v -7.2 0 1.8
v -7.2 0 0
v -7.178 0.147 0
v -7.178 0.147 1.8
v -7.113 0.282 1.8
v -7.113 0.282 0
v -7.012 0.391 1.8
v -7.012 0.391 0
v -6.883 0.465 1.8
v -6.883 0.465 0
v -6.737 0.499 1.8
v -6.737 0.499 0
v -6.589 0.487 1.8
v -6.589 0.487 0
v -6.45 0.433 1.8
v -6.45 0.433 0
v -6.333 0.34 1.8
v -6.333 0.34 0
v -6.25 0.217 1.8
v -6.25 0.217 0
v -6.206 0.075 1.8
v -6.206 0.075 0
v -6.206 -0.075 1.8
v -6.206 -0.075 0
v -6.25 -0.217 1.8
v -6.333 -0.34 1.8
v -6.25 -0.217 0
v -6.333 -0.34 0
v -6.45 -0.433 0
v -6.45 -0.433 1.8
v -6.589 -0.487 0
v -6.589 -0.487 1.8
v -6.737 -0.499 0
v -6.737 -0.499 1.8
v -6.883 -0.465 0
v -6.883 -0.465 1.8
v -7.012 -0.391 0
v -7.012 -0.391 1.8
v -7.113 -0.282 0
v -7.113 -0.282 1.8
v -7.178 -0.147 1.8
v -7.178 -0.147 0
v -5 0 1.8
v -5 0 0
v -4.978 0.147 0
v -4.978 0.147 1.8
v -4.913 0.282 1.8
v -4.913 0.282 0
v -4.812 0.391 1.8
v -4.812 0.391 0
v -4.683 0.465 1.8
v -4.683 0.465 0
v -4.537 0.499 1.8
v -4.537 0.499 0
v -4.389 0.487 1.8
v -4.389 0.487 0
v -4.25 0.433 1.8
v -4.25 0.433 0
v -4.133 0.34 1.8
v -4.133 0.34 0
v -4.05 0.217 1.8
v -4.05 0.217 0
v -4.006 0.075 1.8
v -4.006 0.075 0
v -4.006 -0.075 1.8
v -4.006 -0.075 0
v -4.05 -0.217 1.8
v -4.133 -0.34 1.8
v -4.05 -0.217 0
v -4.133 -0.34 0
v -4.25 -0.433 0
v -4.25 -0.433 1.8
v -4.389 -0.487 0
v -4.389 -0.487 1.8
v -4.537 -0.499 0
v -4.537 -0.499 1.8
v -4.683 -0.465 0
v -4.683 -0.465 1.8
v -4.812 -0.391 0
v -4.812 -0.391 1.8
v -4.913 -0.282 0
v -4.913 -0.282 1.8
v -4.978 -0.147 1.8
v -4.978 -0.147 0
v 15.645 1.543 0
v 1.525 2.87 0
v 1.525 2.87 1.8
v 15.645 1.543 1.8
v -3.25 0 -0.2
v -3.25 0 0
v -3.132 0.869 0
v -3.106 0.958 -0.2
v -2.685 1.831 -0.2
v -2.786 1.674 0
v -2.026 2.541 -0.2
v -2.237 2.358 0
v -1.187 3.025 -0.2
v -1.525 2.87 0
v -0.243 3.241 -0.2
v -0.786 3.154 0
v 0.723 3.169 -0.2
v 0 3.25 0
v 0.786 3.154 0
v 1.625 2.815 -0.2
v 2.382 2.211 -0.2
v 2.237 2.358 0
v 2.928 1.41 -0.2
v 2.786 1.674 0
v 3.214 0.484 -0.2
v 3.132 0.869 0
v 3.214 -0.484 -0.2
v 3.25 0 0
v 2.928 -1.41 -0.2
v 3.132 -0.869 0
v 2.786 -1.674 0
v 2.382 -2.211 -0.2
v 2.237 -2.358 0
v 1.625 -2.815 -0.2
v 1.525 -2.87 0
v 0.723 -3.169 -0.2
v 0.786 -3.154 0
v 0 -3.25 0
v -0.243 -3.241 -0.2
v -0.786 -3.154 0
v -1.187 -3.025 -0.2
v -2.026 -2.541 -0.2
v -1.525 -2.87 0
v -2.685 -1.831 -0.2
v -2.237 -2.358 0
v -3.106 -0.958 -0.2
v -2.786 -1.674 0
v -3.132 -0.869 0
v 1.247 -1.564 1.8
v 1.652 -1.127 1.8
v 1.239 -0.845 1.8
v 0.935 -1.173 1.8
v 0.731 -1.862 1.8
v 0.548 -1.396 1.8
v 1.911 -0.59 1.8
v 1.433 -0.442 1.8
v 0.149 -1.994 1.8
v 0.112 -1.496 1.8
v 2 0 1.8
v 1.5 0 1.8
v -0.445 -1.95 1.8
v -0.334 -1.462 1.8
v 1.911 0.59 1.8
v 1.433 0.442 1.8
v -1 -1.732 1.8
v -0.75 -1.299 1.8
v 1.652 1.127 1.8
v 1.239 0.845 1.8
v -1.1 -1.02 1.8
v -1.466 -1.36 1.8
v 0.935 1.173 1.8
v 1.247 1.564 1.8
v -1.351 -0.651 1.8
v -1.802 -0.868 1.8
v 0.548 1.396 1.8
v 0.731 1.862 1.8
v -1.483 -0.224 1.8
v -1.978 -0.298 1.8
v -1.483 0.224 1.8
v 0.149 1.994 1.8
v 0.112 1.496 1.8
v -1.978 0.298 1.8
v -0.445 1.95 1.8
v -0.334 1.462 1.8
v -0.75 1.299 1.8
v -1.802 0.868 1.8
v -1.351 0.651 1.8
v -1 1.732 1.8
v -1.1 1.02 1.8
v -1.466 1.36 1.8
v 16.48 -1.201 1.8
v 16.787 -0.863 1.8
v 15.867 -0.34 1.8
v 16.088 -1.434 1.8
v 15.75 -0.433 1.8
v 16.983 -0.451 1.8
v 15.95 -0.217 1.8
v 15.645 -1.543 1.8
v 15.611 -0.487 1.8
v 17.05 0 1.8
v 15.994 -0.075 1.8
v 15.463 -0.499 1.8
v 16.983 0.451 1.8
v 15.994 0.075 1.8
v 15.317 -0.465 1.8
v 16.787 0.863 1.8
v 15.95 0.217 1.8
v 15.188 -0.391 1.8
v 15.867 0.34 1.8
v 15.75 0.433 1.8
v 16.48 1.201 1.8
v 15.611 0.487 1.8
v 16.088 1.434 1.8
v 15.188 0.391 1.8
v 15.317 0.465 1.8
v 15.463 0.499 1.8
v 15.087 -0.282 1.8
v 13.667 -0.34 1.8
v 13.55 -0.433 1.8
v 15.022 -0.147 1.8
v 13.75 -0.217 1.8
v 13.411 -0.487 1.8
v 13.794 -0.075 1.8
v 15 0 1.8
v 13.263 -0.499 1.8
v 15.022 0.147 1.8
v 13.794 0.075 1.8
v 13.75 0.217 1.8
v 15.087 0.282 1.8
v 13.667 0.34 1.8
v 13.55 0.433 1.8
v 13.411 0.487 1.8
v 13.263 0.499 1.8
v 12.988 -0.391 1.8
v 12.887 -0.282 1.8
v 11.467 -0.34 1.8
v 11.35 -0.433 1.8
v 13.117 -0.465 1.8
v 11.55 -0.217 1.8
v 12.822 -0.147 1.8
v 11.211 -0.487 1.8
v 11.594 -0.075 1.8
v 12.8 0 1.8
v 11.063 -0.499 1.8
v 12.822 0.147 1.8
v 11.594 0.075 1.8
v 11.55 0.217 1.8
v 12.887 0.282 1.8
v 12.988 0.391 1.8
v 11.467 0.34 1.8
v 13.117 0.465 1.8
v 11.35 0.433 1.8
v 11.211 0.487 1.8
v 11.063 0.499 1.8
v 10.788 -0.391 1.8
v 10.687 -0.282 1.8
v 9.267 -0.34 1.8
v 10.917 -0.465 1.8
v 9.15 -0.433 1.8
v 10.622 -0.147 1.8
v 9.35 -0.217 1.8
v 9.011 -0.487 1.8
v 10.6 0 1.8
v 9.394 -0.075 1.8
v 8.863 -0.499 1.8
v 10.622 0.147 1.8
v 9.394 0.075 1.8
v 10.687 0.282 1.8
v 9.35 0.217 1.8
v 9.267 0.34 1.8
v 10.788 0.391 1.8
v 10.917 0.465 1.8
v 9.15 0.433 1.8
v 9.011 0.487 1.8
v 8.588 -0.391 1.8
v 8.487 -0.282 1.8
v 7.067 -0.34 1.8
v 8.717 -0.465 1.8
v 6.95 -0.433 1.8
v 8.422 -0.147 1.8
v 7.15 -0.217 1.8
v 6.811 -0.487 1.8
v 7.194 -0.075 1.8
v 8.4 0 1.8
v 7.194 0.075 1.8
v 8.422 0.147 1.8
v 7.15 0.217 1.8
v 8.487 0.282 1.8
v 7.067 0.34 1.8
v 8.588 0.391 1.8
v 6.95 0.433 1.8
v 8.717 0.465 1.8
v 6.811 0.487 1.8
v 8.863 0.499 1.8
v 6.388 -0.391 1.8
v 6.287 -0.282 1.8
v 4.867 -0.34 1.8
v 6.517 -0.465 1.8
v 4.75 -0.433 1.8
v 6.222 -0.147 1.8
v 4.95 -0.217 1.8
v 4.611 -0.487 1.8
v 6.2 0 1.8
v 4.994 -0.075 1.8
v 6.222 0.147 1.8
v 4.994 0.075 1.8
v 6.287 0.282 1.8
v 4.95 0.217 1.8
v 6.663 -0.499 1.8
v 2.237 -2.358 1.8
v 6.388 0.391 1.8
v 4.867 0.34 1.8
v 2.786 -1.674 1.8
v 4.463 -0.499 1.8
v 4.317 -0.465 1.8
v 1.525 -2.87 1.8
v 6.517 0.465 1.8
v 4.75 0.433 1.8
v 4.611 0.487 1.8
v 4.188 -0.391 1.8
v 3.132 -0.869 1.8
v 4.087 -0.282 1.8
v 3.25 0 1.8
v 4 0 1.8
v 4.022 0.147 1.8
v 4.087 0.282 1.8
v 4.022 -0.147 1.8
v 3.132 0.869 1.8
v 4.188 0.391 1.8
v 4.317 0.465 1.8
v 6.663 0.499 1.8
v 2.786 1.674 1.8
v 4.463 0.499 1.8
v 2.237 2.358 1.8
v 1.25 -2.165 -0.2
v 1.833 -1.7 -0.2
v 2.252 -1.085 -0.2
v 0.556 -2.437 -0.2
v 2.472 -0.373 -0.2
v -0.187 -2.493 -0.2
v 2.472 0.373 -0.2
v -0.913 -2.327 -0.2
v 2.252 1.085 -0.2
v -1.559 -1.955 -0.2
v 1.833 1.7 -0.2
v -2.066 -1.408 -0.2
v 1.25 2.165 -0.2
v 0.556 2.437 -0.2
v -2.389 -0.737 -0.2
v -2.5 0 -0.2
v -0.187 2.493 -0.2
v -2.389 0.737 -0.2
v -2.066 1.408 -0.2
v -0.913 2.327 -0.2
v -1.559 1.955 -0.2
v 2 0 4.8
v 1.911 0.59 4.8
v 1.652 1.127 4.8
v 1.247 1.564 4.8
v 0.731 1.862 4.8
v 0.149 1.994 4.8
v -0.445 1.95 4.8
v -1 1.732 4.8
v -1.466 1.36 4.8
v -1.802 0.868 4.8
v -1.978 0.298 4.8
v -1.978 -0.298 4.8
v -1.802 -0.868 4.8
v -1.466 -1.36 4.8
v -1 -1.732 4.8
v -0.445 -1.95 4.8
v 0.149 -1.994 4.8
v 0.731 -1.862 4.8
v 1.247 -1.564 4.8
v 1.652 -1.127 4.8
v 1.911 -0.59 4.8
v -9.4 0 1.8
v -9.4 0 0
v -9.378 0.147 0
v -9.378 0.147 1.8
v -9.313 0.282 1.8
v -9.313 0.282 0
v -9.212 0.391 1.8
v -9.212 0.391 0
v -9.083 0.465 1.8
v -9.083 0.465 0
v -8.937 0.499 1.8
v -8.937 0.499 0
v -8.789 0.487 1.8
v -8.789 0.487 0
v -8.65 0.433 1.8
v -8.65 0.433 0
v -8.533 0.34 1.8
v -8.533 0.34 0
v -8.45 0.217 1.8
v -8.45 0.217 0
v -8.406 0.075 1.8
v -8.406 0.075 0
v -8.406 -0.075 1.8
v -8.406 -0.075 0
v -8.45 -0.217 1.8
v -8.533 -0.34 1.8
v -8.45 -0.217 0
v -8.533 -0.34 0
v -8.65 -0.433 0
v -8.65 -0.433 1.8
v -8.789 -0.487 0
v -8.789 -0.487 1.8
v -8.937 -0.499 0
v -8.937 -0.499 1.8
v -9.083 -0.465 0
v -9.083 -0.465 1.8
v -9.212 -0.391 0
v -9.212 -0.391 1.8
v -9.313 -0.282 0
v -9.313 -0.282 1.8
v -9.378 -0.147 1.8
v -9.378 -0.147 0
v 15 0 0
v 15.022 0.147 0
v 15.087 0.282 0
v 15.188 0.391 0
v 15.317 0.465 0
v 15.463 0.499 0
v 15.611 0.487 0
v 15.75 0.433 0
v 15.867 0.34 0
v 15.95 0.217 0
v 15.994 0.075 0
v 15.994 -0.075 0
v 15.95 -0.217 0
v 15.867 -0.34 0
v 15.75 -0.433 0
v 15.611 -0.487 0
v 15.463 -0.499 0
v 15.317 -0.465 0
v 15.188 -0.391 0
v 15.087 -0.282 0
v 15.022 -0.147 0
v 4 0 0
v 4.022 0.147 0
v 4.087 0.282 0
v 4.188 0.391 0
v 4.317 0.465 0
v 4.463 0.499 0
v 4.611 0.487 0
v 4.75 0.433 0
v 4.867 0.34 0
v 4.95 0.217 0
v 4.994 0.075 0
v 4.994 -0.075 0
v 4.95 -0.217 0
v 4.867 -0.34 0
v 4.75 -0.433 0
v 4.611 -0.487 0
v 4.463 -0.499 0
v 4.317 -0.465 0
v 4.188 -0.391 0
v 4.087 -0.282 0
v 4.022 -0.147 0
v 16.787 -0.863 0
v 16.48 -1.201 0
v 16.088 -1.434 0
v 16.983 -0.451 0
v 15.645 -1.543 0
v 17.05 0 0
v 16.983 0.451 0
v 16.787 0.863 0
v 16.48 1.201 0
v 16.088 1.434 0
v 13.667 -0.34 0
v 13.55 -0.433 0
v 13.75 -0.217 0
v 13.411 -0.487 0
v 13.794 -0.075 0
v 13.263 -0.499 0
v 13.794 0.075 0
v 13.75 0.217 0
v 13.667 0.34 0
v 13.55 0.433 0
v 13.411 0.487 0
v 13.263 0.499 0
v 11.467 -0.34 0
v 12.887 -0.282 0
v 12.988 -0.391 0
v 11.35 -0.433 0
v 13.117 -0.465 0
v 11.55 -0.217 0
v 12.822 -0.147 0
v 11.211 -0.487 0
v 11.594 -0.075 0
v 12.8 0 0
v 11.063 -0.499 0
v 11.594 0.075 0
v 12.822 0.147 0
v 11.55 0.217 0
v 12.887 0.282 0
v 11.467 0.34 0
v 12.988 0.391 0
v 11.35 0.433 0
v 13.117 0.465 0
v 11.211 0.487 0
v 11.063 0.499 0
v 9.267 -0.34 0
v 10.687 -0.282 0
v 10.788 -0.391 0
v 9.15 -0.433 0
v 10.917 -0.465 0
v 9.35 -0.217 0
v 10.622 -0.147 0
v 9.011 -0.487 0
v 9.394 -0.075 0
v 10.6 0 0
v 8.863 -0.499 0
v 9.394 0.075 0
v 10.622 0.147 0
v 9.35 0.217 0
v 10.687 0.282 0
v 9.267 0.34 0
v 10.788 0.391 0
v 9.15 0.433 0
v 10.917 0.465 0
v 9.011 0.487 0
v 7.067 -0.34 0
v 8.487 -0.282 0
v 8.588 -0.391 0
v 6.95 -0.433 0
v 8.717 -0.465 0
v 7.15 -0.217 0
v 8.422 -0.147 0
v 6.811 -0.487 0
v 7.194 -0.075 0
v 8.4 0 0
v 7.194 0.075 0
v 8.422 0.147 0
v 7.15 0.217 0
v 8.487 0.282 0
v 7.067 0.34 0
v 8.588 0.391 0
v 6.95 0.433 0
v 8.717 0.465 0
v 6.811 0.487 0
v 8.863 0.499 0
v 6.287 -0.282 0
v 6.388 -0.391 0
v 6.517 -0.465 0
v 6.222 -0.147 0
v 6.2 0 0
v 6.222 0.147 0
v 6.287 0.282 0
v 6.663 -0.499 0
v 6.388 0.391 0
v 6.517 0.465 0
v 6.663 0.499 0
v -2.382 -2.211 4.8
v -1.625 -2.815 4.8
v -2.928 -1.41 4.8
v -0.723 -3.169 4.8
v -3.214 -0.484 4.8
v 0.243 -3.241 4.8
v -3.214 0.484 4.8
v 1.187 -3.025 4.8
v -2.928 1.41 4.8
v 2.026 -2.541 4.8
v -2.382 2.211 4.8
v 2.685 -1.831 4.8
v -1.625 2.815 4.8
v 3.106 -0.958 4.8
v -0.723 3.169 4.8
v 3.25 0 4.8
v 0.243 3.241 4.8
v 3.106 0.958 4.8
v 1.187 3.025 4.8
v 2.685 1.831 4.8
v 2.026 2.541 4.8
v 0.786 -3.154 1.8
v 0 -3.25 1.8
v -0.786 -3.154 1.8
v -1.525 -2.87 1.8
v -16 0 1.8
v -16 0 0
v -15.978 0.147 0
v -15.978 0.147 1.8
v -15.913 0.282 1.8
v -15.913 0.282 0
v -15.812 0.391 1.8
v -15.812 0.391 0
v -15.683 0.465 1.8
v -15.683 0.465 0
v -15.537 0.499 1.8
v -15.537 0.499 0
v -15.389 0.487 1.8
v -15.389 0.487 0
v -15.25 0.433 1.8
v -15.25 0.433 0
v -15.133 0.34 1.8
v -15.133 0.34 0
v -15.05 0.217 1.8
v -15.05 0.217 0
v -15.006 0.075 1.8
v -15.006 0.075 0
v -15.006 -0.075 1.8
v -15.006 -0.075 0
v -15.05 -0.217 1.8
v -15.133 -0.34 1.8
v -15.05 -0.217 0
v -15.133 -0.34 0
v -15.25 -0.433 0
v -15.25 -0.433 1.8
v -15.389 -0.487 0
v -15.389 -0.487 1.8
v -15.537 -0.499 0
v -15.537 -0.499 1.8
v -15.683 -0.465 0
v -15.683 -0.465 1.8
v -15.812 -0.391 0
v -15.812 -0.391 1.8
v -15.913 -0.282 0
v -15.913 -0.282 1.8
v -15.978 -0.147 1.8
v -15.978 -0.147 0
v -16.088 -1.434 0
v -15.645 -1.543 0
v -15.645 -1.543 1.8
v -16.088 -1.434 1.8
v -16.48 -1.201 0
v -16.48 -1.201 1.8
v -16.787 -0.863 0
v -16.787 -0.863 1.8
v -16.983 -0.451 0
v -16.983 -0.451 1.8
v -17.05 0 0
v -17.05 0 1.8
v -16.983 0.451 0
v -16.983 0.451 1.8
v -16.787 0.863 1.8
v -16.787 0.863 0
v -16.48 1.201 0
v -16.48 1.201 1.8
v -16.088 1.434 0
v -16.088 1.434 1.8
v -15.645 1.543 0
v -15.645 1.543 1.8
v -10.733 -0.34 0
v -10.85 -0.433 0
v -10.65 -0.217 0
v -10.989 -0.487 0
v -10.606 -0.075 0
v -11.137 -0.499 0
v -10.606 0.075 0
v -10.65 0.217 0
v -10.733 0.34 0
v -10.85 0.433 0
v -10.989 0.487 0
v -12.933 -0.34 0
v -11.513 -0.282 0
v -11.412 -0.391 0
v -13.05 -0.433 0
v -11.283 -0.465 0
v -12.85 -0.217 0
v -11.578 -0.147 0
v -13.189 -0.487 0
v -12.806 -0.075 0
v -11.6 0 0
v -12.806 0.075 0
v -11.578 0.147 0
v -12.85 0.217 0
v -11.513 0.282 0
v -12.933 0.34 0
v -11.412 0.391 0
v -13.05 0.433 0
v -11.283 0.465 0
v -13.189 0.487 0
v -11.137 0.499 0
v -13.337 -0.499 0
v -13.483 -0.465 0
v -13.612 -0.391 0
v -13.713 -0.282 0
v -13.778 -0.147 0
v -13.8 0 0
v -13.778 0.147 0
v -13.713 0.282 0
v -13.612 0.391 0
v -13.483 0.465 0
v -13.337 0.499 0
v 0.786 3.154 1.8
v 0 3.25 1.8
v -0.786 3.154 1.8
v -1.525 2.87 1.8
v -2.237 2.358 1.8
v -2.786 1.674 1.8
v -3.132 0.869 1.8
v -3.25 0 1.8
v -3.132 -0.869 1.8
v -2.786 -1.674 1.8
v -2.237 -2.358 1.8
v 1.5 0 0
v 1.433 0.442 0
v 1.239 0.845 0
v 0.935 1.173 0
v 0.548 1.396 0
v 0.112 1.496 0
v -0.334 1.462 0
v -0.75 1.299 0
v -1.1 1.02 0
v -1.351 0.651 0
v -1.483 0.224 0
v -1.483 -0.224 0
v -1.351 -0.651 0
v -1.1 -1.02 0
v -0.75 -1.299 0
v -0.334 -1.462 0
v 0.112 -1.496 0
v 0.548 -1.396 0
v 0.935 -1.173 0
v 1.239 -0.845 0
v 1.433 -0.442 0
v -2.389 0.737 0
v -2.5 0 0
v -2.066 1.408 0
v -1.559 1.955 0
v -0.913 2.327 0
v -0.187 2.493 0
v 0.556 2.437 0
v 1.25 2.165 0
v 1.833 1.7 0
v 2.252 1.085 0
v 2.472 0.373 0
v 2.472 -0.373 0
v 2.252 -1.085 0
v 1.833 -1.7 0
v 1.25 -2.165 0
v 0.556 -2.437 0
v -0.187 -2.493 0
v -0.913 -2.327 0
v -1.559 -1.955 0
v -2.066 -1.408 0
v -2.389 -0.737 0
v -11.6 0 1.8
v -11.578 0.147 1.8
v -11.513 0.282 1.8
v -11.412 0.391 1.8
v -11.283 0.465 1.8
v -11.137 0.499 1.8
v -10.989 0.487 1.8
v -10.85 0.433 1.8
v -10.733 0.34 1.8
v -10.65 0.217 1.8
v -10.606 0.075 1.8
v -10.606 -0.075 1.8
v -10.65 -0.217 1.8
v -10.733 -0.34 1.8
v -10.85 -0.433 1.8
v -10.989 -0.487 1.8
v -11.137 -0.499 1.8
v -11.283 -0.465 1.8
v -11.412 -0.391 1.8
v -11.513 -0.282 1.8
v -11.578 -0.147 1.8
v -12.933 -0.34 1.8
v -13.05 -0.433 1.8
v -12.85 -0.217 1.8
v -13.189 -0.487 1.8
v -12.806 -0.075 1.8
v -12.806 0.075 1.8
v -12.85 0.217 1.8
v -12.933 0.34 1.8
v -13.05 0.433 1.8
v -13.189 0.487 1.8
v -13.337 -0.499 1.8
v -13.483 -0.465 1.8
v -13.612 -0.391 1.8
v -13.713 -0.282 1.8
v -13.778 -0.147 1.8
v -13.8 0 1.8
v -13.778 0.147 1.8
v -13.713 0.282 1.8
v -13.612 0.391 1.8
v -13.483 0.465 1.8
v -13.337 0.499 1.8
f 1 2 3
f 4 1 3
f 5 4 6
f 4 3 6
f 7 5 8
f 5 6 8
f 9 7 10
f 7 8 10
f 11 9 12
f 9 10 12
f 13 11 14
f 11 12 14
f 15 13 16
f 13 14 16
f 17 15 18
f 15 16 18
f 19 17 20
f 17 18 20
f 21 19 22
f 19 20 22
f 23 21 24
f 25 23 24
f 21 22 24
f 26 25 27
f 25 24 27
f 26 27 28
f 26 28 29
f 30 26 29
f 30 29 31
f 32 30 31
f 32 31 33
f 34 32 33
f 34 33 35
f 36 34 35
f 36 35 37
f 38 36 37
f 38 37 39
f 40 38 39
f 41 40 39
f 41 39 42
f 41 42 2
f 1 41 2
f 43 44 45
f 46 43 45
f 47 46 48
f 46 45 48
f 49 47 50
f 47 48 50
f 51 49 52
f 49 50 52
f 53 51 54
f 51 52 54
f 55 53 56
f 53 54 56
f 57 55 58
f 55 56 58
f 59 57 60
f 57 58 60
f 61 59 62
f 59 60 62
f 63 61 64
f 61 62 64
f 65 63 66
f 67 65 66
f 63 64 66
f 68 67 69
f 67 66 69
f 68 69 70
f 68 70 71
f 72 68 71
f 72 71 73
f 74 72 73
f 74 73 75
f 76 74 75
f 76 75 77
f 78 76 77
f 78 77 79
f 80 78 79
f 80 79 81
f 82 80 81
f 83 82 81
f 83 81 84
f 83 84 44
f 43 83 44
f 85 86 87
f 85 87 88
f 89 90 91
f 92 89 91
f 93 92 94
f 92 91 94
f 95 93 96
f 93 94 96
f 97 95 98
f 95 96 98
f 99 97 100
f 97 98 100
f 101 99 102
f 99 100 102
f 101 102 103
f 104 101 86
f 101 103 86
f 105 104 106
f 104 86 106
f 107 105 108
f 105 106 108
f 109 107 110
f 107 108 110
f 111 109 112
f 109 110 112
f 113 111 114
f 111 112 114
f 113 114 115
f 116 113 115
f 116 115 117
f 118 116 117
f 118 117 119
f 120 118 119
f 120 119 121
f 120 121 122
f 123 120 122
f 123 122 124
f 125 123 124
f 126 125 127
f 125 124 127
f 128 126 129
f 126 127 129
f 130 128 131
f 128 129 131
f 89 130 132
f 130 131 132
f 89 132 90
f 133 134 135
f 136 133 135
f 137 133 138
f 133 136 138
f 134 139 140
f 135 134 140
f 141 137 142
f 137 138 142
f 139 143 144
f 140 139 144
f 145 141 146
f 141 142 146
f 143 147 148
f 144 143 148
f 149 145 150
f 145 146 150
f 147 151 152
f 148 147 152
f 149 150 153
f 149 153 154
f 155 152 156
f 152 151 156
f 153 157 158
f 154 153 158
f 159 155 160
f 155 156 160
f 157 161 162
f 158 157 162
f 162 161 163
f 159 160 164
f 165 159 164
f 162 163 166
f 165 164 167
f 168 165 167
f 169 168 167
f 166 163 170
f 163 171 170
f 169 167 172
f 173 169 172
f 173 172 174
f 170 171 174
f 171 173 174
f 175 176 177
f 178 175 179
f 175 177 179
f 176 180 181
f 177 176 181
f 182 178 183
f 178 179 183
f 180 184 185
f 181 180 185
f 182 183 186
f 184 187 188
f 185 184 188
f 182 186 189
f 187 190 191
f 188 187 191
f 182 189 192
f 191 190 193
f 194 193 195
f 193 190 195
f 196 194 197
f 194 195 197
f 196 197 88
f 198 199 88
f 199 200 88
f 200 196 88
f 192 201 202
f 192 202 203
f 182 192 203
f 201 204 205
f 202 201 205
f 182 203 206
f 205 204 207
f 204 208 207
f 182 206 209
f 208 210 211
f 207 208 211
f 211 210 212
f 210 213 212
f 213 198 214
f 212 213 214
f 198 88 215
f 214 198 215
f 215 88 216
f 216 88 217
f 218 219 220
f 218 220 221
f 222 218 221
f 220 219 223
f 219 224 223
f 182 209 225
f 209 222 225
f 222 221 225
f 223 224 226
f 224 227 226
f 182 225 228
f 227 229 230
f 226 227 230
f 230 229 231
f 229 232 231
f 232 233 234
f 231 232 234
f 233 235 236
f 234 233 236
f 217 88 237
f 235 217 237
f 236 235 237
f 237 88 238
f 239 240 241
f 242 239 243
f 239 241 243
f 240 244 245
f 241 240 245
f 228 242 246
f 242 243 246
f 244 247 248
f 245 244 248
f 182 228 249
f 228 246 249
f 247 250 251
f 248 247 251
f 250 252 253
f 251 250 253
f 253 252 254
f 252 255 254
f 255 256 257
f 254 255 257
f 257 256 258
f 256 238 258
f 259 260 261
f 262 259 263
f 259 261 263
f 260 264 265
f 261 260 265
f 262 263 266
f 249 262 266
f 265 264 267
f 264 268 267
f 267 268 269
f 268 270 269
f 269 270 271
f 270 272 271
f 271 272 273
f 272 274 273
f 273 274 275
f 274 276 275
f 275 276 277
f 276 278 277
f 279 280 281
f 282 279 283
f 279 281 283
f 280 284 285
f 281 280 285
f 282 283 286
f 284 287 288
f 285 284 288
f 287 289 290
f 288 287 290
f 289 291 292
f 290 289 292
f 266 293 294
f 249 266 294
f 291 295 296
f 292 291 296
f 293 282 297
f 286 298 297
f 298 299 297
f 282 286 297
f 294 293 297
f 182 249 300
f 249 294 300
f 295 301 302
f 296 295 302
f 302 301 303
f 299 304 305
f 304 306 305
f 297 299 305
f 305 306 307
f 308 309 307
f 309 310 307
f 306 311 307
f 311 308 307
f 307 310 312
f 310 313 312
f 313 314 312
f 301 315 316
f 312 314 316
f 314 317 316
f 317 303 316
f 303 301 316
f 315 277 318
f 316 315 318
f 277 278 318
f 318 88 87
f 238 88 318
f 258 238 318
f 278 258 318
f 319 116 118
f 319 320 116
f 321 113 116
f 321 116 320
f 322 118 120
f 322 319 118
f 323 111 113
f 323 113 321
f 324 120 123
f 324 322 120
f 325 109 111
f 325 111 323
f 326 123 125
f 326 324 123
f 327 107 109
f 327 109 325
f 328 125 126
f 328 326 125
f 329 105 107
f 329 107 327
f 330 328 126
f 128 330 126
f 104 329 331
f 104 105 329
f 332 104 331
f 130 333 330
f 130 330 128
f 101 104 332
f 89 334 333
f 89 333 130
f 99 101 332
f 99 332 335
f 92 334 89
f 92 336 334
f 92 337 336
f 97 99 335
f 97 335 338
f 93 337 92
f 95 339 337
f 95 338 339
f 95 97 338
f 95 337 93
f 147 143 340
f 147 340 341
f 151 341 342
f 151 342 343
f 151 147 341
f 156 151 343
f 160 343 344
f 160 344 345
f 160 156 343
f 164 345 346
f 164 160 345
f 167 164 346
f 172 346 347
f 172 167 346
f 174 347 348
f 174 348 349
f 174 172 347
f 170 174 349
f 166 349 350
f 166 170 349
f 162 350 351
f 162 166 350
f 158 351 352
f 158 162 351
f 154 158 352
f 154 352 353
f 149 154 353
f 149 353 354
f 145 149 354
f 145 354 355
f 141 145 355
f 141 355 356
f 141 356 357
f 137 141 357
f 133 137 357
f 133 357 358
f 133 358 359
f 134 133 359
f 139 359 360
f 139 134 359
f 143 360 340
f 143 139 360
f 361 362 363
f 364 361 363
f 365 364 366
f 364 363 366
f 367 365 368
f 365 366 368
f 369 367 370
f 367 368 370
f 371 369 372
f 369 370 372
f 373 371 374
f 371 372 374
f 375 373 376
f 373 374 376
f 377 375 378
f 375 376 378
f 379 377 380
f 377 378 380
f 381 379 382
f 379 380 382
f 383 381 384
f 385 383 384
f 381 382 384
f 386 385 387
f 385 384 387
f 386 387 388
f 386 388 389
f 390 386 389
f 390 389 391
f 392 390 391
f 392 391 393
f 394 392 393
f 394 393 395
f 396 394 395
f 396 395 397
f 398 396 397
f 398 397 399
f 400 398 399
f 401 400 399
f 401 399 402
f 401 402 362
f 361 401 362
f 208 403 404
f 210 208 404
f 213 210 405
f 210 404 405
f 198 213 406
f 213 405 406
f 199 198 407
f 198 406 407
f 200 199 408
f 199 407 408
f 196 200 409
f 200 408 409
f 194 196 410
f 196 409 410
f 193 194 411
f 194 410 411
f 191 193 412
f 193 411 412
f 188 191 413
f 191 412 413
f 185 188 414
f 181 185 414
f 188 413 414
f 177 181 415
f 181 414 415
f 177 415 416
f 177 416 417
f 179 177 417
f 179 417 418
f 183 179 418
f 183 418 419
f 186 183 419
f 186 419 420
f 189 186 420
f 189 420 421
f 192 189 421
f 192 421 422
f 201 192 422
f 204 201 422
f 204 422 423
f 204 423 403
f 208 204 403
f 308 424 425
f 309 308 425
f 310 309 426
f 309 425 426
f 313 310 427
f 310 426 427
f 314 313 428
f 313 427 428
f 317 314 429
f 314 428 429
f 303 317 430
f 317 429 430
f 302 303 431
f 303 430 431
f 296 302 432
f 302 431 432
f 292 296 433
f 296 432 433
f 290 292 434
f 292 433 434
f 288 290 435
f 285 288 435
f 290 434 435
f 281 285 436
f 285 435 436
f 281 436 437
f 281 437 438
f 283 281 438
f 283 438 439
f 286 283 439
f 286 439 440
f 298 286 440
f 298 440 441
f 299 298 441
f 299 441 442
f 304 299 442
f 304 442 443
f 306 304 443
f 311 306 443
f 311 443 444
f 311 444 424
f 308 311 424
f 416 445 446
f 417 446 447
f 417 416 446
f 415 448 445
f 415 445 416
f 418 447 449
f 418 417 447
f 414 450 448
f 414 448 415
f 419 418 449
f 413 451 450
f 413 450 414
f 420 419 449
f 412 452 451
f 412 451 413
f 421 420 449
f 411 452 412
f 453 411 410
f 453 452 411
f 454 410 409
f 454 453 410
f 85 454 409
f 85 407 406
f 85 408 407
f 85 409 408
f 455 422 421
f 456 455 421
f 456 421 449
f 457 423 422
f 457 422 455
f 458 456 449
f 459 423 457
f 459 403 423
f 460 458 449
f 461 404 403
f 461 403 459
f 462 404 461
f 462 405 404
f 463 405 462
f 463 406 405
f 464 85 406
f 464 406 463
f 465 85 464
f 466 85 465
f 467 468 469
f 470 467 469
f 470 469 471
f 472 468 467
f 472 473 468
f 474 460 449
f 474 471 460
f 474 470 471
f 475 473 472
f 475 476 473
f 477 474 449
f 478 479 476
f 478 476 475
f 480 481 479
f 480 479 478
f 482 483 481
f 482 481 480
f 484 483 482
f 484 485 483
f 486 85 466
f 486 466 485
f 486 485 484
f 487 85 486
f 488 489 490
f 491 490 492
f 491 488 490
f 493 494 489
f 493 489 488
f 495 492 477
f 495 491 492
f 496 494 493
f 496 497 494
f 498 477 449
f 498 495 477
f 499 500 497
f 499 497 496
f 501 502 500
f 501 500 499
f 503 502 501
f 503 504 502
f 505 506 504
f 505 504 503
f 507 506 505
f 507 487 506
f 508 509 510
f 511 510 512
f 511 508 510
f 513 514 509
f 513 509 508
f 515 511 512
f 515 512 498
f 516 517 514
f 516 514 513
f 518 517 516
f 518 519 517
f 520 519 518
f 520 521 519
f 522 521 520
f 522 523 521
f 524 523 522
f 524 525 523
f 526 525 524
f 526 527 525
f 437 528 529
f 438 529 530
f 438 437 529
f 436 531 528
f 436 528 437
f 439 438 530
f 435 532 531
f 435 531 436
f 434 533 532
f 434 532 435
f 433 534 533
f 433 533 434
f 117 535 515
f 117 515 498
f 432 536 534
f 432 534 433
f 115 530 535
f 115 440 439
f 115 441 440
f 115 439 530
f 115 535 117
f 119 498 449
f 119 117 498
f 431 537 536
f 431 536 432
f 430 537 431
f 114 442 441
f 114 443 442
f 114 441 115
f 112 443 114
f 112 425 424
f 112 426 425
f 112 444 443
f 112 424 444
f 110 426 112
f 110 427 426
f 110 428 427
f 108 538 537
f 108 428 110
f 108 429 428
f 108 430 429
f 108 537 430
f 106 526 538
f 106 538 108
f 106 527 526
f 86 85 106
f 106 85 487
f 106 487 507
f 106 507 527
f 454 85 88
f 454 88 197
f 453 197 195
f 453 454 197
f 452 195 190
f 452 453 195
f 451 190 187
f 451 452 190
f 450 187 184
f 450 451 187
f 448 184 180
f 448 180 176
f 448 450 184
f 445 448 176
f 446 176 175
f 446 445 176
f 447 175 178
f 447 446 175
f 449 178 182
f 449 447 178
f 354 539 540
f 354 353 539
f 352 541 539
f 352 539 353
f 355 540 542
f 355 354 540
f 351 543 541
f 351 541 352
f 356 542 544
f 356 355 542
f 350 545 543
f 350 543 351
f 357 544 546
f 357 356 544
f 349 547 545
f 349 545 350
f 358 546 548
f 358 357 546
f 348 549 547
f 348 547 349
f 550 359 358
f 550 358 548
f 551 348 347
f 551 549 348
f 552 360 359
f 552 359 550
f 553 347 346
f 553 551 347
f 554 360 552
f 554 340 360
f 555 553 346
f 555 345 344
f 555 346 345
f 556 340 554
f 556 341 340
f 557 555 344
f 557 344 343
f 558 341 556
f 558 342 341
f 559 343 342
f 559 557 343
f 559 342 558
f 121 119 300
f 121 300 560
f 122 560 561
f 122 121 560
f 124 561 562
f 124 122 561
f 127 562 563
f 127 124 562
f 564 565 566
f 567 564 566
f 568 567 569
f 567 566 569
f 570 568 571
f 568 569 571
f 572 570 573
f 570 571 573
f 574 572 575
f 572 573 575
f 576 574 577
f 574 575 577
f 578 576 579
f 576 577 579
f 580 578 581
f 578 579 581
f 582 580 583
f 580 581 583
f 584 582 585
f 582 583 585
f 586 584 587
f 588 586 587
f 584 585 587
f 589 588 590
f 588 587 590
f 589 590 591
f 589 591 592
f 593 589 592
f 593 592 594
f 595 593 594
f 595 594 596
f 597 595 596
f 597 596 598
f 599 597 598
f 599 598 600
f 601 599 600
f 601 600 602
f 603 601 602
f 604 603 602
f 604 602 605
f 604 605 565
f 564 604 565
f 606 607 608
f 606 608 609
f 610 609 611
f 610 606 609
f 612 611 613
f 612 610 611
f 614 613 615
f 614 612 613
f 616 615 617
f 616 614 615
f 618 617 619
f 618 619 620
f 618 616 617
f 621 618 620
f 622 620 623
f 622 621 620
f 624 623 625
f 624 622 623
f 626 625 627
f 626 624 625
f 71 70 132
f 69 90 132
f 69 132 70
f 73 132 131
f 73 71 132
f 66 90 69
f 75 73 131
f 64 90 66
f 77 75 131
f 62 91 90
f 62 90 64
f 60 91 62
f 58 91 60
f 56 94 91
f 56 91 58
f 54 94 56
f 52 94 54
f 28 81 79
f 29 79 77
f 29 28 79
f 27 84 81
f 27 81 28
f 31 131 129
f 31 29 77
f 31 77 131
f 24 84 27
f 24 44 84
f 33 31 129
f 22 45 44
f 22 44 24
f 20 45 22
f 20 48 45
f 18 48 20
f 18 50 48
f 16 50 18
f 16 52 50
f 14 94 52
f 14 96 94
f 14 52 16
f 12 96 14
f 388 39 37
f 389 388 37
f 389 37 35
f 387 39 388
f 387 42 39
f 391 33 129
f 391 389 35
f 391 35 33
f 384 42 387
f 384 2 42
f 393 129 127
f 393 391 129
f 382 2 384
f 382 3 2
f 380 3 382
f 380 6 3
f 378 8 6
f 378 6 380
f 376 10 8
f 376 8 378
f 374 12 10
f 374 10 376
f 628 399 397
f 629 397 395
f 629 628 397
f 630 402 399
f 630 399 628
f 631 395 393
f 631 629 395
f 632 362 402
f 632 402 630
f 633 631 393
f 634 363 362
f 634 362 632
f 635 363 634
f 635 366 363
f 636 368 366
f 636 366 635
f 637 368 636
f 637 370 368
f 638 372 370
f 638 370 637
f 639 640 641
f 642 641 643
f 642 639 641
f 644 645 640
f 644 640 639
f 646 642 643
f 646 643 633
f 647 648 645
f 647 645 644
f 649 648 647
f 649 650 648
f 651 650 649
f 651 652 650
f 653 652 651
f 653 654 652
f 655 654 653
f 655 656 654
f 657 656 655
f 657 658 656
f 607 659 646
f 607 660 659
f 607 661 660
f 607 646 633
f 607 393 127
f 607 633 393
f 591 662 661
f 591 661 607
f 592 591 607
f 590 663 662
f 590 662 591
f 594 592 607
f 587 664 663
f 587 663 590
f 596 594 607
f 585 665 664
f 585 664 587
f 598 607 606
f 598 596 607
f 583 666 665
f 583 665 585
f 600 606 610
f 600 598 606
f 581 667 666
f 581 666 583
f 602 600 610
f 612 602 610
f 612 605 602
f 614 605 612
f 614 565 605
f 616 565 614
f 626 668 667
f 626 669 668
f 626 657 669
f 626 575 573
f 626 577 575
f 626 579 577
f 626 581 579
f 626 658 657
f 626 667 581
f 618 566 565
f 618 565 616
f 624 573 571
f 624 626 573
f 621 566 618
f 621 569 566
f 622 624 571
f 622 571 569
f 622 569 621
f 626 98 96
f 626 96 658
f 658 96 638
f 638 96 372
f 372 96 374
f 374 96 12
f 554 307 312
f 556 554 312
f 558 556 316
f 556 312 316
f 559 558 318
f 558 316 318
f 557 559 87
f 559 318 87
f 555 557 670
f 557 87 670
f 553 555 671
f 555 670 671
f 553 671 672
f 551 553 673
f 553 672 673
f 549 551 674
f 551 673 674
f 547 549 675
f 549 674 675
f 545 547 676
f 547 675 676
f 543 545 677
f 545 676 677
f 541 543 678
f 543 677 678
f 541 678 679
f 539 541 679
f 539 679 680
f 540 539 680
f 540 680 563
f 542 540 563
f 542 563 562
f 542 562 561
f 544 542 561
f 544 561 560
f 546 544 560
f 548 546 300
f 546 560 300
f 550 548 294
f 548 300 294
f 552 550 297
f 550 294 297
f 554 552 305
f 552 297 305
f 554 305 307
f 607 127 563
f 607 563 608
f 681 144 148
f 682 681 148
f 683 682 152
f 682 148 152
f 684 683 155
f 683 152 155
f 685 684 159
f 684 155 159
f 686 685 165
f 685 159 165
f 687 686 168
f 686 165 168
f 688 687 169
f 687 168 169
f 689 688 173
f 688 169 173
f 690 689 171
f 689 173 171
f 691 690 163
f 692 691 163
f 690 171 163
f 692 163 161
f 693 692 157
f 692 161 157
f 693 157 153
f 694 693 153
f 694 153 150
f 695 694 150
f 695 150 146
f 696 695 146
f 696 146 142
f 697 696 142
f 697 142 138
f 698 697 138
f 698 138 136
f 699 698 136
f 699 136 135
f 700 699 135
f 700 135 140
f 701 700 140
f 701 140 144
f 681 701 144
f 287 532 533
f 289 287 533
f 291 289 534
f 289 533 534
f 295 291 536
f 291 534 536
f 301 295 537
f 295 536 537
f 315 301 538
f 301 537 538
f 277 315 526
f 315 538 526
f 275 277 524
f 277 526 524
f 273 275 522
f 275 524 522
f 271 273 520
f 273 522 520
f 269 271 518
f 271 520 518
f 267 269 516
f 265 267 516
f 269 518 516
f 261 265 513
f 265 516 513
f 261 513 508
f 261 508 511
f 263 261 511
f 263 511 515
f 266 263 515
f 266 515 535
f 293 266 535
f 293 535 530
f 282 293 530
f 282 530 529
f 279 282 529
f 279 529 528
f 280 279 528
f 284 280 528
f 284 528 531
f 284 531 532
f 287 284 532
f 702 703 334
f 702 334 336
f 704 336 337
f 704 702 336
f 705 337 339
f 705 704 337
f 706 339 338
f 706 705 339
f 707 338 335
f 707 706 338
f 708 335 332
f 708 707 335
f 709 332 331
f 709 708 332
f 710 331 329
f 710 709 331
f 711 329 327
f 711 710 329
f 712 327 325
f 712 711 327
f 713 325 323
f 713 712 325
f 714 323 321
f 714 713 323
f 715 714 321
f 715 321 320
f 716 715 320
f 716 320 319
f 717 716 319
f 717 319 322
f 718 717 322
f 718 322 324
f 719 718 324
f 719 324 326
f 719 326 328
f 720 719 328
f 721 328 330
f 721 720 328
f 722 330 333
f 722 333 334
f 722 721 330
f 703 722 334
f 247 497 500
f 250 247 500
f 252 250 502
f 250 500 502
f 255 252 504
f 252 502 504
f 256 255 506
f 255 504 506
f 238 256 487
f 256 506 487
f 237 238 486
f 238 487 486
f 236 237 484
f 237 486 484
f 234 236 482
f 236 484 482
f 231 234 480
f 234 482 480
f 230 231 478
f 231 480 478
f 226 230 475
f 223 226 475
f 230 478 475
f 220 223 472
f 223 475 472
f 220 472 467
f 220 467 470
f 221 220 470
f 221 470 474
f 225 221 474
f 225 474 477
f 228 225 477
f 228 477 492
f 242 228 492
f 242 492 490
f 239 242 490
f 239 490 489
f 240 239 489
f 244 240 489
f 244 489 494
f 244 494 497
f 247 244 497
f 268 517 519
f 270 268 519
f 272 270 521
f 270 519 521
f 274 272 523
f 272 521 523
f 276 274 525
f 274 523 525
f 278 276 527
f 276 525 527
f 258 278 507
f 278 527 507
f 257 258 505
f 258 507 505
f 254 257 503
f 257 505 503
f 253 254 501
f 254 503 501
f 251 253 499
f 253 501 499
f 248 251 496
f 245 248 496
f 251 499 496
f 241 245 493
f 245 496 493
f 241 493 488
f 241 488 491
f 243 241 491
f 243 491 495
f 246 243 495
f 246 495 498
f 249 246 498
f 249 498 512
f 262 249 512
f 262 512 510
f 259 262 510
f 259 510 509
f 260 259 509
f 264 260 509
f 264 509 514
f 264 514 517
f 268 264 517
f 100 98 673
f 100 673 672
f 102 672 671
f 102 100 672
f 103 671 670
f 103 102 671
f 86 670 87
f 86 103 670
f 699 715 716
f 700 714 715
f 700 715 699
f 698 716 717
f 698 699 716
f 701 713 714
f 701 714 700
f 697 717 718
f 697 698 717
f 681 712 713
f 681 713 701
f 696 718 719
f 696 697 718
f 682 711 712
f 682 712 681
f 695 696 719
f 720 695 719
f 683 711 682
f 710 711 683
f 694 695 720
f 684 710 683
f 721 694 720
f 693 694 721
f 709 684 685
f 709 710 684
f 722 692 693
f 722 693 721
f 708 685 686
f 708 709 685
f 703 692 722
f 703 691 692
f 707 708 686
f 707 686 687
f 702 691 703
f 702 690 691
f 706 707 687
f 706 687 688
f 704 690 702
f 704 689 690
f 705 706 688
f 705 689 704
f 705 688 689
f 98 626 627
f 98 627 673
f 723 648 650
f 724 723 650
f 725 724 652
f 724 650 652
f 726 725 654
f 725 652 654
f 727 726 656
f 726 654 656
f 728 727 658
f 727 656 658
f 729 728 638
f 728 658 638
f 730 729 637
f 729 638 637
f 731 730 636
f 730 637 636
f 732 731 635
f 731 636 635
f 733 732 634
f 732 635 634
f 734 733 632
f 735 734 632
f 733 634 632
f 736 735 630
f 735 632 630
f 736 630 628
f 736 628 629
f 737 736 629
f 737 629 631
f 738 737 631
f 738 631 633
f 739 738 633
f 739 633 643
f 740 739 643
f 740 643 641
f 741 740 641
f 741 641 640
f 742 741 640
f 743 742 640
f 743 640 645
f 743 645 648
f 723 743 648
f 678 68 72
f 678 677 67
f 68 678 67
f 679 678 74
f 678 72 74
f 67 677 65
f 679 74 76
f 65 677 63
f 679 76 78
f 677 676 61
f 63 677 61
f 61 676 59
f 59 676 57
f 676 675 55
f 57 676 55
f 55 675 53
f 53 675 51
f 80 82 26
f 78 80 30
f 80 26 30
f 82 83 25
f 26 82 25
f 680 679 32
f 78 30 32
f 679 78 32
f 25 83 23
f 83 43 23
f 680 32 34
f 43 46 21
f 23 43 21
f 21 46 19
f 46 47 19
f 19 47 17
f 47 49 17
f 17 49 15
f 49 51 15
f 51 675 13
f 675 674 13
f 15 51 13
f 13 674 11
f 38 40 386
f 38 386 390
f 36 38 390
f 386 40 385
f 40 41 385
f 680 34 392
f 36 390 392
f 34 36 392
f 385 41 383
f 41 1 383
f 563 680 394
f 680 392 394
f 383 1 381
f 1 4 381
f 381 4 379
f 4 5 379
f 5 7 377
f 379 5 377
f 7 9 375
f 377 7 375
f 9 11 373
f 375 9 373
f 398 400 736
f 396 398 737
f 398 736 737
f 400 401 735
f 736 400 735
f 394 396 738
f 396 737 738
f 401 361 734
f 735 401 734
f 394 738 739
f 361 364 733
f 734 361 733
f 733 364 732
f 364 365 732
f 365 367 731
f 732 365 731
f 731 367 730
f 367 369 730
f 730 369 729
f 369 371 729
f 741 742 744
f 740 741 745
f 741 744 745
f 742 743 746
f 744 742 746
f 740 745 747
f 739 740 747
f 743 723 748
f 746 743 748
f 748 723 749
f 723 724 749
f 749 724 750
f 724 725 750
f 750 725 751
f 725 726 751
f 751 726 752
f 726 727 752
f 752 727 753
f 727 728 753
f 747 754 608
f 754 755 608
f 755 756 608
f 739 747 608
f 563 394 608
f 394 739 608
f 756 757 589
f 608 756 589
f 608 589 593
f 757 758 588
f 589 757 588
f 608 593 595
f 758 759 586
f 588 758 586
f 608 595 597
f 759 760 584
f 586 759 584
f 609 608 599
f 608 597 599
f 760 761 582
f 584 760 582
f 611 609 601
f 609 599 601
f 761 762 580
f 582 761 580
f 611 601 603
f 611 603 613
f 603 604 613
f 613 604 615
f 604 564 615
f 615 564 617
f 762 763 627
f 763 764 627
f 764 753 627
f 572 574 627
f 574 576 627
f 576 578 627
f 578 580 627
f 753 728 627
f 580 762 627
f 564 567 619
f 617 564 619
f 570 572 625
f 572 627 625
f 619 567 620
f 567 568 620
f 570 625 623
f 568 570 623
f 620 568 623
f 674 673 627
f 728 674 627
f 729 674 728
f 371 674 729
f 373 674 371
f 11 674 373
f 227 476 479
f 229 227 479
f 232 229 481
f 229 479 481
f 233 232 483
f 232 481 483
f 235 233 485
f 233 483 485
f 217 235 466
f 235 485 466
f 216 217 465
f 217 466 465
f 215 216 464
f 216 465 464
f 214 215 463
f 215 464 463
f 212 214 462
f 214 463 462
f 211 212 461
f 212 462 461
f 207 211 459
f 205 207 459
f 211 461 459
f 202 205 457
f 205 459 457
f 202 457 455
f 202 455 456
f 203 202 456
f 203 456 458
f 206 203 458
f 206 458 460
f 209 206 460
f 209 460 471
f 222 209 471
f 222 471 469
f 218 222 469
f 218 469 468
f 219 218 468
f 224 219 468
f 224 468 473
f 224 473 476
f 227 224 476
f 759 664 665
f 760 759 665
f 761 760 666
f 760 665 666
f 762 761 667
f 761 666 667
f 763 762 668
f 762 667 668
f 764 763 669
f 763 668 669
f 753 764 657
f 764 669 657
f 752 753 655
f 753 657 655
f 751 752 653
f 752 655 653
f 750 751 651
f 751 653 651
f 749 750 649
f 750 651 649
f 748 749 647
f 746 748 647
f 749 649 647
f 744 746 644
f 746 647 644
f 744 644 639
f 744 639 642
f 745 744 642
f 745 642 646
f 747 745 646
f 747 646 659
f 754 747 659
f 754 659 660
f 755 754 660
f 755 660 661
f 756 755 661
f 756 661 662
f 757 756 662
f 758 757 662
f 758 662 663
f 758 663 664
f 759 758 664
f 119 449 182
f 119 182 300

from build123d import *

# Parameters (mm, degrees)
BOSS_EXTRUDE1_DEPTH = 1.8
SKETCH2_R           = 3.25
SKETCH2_R_2         = 2.5
BOSS_EXTRUDE3_DEPTH = 0.2
SKETCH4_R           = 3.25
SKETCH4_R_2         = 2
BOSS_EXTRUDE4_DEPTH = 3
CUT_EXTRUDE1_REACH  = 4
SKETCH5_R           = 1.5
CUT_EXTRUDE2_REACH  = 6.8
SKETCH6_R           = 0.5


with BuildPart() as part:
    # Sketch1 → Boss-Extrude1 (new body)
    with BuildSketch(Plane.XY):
        with BuildLine():
            Line((1.525163579, 2.869908719), (15.645, 1.543202838))
            ThreePointArc((15.645, 1.543202838), (17.05, 0), (15.645, -1.543202838))
            Line((15.645, -1.543202838), (1.525163579, -2.869908719))
            ThreePointArc((1.525163579, -2.869908719), (0, -3.25), (-1.525163579, -2.869908719))
            Line((-1.525163579, -2.869908719), (-15.645, -1.543202838))
            ThreePointArc((-15.645, -1.543202838), (-17.05, 0), (-15.645, 1.543202838))
            Line((-15.645, 1.543202838), (-1.525163579, 2.869908719))
            ThreePointArc((-1.525163579, 2.869908719), (0, 3.25), (1.525163579, 2.869908719))
        make_face()
    extrude(amount=BOSS_EXTRUDE1_DEPTH)

    # Sketch2 → Boss-Extrude3 (add)
    with BuildSketch(Plane(origin=(0, 0, 0), x_dir=(-1, 0, 0), z_dir=(0, 0, -1))):
        Circle(SKETCH2_R)
        Circle(SKETCH2_R_2, mode=Mode.SUBTRACT)
    extrude(amount=BOSS_EXTRUDE3_DEPTH)

    # Sketch4 → Boss-Extrude4 (add)
    with BuildSketch(Plane.XY.offset(1.8)):
        Circle(SKETCH4_R)
        Circle(SKETCH4_R_2, mode=Mode.SUBTRACT)
    extrude(amount=BOSS_EXTRUDE4_DEPTH)

    # Sketch5 → Cut-Extrude1 (cut, up to next)
    with BuildSketch(Plane.XY.offset(1.8), mode=Mode.PRIVATE) as cut_extrude1_sk1:
        Circle(SKETCH5_R)
    cut_extrude1_tool1 = extrude(cut_extrude1_sk1.sketch, amount=-CUT_EXTRUDE1_REACH, mode=Mode.PRIVATE) & part.part
    add(cut_extrude1_tool1.solids().sort_by_distance((0, 0, 1.8))[0], mode=Mode.SUBTRACT)

    # Sketch6 → Cut-Extrude2 (cut, up to next)
    with BuildSketch(Plane(origin=(0, 0, 0), x_dir=(-1, 0, 0), z_dir=(0, 0, -1)), mode=Mode.PRIVATE) as cut_extrude2_sk1:
        with Locations((15.5, 0)):
            Circle(SKETCH6_R)
    cut_extrude2_tool1 = extrude(cut_extrude2_sk1.sketch, amount=-CUT_EXTRUDE2_REACH, mode=Mode.PRIVATE) & part.part
    add(cut_extrude2_tool1.solids().sort_by_distance((-15.5, 0, 0))[0], mode=Mode.SUBTRACT)
    # Sketch6 → Cut-Extrude2 (cut, up to next)
    with BuildSketch(Plane(origin=(0, 0, 0), x_dir=(-1, 0, 0), z_dir=(0, 0, -1)), mode=Mode.PRIVATE) as cut_extrude2_sk2:
        with Locations((13.3, 0)):
            Circle(SKETCH6_R)
    cut_extrude2_tool2 = extrude(cut_extrude2_sk2.sketch, amount=-CUT_EXTRUDE2_REACH, mode=Mode.PRIVATE) & part.part
    add(cut_extrude2_tool2.solids().sort_by_distance((-13.3, 0, 0))[0], mode=Mode.SUBTRACT)
    # Sketch6 → Cut-Extrude2 (cut, up to next)
    with BuildSketch(Plane(origin=(0, 0, 0), x_dir=(-1, 0, 0), z_dir=(0, 0, -1)), mode=Mode.PRIVATE) as cut_extrude2_sk3:
        with Locations((11.1, 0)):
            Circle(SKETCH6_R)
    cut_extrude2_tool3 = extrude(cut_extrude2_sk3.sketch, amount=-CUT_EXTRUDE2_REACH, mode=Mode.PRIVATE) & part.part
    add(cut_extrude2_tool3.solids().sort_by_distance((-11.1, 0, 0))[0], mode=Mode.SUBTRACT)
    # Sketch6 → Cut-Extrude2 (cut, up to next)
    with BuildSketch(Plane(origin=(0, 0, 0), x_dir=(-1, 0, 0), z_dir=(0, 0, -1)), mode=Mode.PRIVATE) as cut_extrude2_sk4:
        with Locations((8.9, 0)):
            Circle(SKETCH6_R)
    cut_extrude2_tool4 = extrude(cut_extrude2_sk4.sketch, amount=-CUT_EXTRUDE2_REACH, mode=Mode.PRIVATE) & part.part
    add(cut_extrude2_tool4.solids().sort_by_distance((-8.9, 0, 0))[0], mode=Mode.SUBTRACT)
    # Sketch6 → Cut-Extrude2 (cut, up to next)
    with BuildSketch(Plane(origin=(0, 0, 0), x_dir=(-1, 0, 0), z_dir=(0, 0, -1)), mode=Mode.PRIVATE) as cut_extrude2_sk5:
        with Locations((6.7, 0)):
            Circle(SKETCH6_R)
    cut_extrude2_tool5 = extrude(cut_extrude2_sk5.sketch, amount=-CUT_EXTRUDE2_REACH, mode=Mode.PRIVATE) & part.part
    add(cut_extrude2_tool5.solids().sort_by_distance((-6.7, 0, 0))[0], mode=Mode.SUBTRACT)
    # Sketch6 → Cut-Extrude2 (cut, up to next)
    with BuildSketch(Plane(origin=(0, 0, 0), x_dir=(-1, 0, 0), z_dir=(0, 0, -1)), mode=Mode.PRIVATE) as cut_extrude2_sk6:
        with Locations((4.5, 0)):
            Circle(SKETCH6_R)
    cut_extrude2_tool6 = extrude(cut_extrude2_sk6.sketch, amount=-CUT_EXTRUDE2_REACH, mode=Mode.PRIVATE) & part.part
    add(cut_extrude2_tool6.solids().sort_by_distance((-4.5, 0, 0))[0], mode=Mode.SUBTRACT)
    # Sketch6 → Cut-Extrude2 (cut, up to next)
    with BuildSketch(Plane(origin=(0, 0, 0), x_dir=(-1, 0, 0), z_dir=(0, 0, -1)), mode=Mode.PRIVATE) as cut_extrude2_sk7:
        with Locations((-4.5, 0)):
            Circle(SKETCH6_R)
    cut_extrude2_tool7 = extrude(cut_extrude2_sk7.sketch, amount=-CUT_EXTRUDE2_REACH, mode=Mode.PRIVATE) & part.part
    add(cut_extrude2_tool7.solids().sort_by_distance((4.5, 0, 0))[0], mode=Mode.SUBTRACT)
    # Sketch6 → Cut-Extrude2 (cut, up to next)
    with BuildSketch(Plane(origin=(0, 0, 0), x_dir=(-1, 0, 0), z_dir=(0, 0, -1)), mode=Mode.PRIVATE) as cut_extrude2_sk8:
        with Locations((-6.7, 0)):
            Circle(SKETCH6_R)
    cut_extrude2_tool8 = extrude(cut_extrude2_sk8.sketch, amount=-CUT_EXTRUDE2_REACH, mode=Mode.PRIVATE) & part.part
    add(cut_extrude2_tool8.solids().sort_by_distance((6.7, 0, 0))[0], mode=Mode.SUBTRACT)
    # Sketch6 → Cut-Extrude2 (cut, up to next)
    with BuildSketch(Plane(origin=(0, 0, 0), x_dir=(-1, 0, 0), z_dir=(0, 0, -1)), mode=Mode.PRIVATE) as cut_extrude2_sk9:
        with Locations((-8.9, 0)):
            Circle(SKETCH6_R)
    cut_extrude2_tool9 = extrude(cut_extrude2_sk9.sketch, amount=-CUT_EXTRUDE2_REACH, mode=Mode.PRIVATE) & part.part
    add(cut_extrude2_tool9.solids().sort_by_distance((8.9, 0, 0))[0], mode=Mode.SUBTRACT)
    # Sketch6 → Cut-Extrude2 (cut, up to next)
    with BuildSketch(Plane(origin=(0, 0, 0), x_dir=(-1, 0, 0), z_dir=(0, 0, -1)), mode=Mode.PRIVATE) as cut_extrude2_sk10:
        with Locations((-11.1, 0)):
            Circle(SKETCH6_R)
    cut_extrude2_tool10 = extrude(cut_extrude2_sk10.sketch, amount=-CUT_EXTRUDE2_REACH, mode=Mode.PRIVATE) & part.part
    add(cut_extrude2_tool10.solids().sort_by_distance((11.1, 0, 0))[0], mode=Mode.SUBTRACT)
    # Sketch6 → Cut-Extrude2 (cut, up to next)
    with BuildSketch(Plane(origin=(0, 0, 0), x_dir=(-1, 0, 0), z_dir=(0, 0, -1)), mode=Mode.PRIVATE) as cut_extrude2_sk11:
        with Locations((-13.3, 0)):
            Circle(SKETCH6_R)
    cut_extrude2_tool11 = extrude(cut_extrude2_sk11.sketch, amount=-CUT_EXTRUDE2_REACH, mode=Mode.PRIVATE) & part.part
    add(cut_extrude2_tool11.solids().sort_by_distance((13.3, 0, 0))[0], mode=Mode.SUBTRACT)
    # Sketch6 → Cut-Extrude2 (cut, up to next)
    with BuildSketch(Plane(origin=(0, 0, 0), x_dir=(-1, 0, 0), z_dir=(0, 0, -1)), mode=Mode.PRIVATE) as cut_extrude2_sk12:
        with Locations((-15.5, 0)):
            Circle(SKETCH6_R)
    cut_extrude2_tool12 = extrude(cut_extrude2_sk12.sketch, amount=-CUT_EXTRUDE2_REACH, mode=Mode.PRIVATE) & part.part
    add(cut_extrude2_tool12.solids().sort_by_distance((15.5, 0, 0))[0], mode=Mode.SUBTRACT)


solid = part.part
